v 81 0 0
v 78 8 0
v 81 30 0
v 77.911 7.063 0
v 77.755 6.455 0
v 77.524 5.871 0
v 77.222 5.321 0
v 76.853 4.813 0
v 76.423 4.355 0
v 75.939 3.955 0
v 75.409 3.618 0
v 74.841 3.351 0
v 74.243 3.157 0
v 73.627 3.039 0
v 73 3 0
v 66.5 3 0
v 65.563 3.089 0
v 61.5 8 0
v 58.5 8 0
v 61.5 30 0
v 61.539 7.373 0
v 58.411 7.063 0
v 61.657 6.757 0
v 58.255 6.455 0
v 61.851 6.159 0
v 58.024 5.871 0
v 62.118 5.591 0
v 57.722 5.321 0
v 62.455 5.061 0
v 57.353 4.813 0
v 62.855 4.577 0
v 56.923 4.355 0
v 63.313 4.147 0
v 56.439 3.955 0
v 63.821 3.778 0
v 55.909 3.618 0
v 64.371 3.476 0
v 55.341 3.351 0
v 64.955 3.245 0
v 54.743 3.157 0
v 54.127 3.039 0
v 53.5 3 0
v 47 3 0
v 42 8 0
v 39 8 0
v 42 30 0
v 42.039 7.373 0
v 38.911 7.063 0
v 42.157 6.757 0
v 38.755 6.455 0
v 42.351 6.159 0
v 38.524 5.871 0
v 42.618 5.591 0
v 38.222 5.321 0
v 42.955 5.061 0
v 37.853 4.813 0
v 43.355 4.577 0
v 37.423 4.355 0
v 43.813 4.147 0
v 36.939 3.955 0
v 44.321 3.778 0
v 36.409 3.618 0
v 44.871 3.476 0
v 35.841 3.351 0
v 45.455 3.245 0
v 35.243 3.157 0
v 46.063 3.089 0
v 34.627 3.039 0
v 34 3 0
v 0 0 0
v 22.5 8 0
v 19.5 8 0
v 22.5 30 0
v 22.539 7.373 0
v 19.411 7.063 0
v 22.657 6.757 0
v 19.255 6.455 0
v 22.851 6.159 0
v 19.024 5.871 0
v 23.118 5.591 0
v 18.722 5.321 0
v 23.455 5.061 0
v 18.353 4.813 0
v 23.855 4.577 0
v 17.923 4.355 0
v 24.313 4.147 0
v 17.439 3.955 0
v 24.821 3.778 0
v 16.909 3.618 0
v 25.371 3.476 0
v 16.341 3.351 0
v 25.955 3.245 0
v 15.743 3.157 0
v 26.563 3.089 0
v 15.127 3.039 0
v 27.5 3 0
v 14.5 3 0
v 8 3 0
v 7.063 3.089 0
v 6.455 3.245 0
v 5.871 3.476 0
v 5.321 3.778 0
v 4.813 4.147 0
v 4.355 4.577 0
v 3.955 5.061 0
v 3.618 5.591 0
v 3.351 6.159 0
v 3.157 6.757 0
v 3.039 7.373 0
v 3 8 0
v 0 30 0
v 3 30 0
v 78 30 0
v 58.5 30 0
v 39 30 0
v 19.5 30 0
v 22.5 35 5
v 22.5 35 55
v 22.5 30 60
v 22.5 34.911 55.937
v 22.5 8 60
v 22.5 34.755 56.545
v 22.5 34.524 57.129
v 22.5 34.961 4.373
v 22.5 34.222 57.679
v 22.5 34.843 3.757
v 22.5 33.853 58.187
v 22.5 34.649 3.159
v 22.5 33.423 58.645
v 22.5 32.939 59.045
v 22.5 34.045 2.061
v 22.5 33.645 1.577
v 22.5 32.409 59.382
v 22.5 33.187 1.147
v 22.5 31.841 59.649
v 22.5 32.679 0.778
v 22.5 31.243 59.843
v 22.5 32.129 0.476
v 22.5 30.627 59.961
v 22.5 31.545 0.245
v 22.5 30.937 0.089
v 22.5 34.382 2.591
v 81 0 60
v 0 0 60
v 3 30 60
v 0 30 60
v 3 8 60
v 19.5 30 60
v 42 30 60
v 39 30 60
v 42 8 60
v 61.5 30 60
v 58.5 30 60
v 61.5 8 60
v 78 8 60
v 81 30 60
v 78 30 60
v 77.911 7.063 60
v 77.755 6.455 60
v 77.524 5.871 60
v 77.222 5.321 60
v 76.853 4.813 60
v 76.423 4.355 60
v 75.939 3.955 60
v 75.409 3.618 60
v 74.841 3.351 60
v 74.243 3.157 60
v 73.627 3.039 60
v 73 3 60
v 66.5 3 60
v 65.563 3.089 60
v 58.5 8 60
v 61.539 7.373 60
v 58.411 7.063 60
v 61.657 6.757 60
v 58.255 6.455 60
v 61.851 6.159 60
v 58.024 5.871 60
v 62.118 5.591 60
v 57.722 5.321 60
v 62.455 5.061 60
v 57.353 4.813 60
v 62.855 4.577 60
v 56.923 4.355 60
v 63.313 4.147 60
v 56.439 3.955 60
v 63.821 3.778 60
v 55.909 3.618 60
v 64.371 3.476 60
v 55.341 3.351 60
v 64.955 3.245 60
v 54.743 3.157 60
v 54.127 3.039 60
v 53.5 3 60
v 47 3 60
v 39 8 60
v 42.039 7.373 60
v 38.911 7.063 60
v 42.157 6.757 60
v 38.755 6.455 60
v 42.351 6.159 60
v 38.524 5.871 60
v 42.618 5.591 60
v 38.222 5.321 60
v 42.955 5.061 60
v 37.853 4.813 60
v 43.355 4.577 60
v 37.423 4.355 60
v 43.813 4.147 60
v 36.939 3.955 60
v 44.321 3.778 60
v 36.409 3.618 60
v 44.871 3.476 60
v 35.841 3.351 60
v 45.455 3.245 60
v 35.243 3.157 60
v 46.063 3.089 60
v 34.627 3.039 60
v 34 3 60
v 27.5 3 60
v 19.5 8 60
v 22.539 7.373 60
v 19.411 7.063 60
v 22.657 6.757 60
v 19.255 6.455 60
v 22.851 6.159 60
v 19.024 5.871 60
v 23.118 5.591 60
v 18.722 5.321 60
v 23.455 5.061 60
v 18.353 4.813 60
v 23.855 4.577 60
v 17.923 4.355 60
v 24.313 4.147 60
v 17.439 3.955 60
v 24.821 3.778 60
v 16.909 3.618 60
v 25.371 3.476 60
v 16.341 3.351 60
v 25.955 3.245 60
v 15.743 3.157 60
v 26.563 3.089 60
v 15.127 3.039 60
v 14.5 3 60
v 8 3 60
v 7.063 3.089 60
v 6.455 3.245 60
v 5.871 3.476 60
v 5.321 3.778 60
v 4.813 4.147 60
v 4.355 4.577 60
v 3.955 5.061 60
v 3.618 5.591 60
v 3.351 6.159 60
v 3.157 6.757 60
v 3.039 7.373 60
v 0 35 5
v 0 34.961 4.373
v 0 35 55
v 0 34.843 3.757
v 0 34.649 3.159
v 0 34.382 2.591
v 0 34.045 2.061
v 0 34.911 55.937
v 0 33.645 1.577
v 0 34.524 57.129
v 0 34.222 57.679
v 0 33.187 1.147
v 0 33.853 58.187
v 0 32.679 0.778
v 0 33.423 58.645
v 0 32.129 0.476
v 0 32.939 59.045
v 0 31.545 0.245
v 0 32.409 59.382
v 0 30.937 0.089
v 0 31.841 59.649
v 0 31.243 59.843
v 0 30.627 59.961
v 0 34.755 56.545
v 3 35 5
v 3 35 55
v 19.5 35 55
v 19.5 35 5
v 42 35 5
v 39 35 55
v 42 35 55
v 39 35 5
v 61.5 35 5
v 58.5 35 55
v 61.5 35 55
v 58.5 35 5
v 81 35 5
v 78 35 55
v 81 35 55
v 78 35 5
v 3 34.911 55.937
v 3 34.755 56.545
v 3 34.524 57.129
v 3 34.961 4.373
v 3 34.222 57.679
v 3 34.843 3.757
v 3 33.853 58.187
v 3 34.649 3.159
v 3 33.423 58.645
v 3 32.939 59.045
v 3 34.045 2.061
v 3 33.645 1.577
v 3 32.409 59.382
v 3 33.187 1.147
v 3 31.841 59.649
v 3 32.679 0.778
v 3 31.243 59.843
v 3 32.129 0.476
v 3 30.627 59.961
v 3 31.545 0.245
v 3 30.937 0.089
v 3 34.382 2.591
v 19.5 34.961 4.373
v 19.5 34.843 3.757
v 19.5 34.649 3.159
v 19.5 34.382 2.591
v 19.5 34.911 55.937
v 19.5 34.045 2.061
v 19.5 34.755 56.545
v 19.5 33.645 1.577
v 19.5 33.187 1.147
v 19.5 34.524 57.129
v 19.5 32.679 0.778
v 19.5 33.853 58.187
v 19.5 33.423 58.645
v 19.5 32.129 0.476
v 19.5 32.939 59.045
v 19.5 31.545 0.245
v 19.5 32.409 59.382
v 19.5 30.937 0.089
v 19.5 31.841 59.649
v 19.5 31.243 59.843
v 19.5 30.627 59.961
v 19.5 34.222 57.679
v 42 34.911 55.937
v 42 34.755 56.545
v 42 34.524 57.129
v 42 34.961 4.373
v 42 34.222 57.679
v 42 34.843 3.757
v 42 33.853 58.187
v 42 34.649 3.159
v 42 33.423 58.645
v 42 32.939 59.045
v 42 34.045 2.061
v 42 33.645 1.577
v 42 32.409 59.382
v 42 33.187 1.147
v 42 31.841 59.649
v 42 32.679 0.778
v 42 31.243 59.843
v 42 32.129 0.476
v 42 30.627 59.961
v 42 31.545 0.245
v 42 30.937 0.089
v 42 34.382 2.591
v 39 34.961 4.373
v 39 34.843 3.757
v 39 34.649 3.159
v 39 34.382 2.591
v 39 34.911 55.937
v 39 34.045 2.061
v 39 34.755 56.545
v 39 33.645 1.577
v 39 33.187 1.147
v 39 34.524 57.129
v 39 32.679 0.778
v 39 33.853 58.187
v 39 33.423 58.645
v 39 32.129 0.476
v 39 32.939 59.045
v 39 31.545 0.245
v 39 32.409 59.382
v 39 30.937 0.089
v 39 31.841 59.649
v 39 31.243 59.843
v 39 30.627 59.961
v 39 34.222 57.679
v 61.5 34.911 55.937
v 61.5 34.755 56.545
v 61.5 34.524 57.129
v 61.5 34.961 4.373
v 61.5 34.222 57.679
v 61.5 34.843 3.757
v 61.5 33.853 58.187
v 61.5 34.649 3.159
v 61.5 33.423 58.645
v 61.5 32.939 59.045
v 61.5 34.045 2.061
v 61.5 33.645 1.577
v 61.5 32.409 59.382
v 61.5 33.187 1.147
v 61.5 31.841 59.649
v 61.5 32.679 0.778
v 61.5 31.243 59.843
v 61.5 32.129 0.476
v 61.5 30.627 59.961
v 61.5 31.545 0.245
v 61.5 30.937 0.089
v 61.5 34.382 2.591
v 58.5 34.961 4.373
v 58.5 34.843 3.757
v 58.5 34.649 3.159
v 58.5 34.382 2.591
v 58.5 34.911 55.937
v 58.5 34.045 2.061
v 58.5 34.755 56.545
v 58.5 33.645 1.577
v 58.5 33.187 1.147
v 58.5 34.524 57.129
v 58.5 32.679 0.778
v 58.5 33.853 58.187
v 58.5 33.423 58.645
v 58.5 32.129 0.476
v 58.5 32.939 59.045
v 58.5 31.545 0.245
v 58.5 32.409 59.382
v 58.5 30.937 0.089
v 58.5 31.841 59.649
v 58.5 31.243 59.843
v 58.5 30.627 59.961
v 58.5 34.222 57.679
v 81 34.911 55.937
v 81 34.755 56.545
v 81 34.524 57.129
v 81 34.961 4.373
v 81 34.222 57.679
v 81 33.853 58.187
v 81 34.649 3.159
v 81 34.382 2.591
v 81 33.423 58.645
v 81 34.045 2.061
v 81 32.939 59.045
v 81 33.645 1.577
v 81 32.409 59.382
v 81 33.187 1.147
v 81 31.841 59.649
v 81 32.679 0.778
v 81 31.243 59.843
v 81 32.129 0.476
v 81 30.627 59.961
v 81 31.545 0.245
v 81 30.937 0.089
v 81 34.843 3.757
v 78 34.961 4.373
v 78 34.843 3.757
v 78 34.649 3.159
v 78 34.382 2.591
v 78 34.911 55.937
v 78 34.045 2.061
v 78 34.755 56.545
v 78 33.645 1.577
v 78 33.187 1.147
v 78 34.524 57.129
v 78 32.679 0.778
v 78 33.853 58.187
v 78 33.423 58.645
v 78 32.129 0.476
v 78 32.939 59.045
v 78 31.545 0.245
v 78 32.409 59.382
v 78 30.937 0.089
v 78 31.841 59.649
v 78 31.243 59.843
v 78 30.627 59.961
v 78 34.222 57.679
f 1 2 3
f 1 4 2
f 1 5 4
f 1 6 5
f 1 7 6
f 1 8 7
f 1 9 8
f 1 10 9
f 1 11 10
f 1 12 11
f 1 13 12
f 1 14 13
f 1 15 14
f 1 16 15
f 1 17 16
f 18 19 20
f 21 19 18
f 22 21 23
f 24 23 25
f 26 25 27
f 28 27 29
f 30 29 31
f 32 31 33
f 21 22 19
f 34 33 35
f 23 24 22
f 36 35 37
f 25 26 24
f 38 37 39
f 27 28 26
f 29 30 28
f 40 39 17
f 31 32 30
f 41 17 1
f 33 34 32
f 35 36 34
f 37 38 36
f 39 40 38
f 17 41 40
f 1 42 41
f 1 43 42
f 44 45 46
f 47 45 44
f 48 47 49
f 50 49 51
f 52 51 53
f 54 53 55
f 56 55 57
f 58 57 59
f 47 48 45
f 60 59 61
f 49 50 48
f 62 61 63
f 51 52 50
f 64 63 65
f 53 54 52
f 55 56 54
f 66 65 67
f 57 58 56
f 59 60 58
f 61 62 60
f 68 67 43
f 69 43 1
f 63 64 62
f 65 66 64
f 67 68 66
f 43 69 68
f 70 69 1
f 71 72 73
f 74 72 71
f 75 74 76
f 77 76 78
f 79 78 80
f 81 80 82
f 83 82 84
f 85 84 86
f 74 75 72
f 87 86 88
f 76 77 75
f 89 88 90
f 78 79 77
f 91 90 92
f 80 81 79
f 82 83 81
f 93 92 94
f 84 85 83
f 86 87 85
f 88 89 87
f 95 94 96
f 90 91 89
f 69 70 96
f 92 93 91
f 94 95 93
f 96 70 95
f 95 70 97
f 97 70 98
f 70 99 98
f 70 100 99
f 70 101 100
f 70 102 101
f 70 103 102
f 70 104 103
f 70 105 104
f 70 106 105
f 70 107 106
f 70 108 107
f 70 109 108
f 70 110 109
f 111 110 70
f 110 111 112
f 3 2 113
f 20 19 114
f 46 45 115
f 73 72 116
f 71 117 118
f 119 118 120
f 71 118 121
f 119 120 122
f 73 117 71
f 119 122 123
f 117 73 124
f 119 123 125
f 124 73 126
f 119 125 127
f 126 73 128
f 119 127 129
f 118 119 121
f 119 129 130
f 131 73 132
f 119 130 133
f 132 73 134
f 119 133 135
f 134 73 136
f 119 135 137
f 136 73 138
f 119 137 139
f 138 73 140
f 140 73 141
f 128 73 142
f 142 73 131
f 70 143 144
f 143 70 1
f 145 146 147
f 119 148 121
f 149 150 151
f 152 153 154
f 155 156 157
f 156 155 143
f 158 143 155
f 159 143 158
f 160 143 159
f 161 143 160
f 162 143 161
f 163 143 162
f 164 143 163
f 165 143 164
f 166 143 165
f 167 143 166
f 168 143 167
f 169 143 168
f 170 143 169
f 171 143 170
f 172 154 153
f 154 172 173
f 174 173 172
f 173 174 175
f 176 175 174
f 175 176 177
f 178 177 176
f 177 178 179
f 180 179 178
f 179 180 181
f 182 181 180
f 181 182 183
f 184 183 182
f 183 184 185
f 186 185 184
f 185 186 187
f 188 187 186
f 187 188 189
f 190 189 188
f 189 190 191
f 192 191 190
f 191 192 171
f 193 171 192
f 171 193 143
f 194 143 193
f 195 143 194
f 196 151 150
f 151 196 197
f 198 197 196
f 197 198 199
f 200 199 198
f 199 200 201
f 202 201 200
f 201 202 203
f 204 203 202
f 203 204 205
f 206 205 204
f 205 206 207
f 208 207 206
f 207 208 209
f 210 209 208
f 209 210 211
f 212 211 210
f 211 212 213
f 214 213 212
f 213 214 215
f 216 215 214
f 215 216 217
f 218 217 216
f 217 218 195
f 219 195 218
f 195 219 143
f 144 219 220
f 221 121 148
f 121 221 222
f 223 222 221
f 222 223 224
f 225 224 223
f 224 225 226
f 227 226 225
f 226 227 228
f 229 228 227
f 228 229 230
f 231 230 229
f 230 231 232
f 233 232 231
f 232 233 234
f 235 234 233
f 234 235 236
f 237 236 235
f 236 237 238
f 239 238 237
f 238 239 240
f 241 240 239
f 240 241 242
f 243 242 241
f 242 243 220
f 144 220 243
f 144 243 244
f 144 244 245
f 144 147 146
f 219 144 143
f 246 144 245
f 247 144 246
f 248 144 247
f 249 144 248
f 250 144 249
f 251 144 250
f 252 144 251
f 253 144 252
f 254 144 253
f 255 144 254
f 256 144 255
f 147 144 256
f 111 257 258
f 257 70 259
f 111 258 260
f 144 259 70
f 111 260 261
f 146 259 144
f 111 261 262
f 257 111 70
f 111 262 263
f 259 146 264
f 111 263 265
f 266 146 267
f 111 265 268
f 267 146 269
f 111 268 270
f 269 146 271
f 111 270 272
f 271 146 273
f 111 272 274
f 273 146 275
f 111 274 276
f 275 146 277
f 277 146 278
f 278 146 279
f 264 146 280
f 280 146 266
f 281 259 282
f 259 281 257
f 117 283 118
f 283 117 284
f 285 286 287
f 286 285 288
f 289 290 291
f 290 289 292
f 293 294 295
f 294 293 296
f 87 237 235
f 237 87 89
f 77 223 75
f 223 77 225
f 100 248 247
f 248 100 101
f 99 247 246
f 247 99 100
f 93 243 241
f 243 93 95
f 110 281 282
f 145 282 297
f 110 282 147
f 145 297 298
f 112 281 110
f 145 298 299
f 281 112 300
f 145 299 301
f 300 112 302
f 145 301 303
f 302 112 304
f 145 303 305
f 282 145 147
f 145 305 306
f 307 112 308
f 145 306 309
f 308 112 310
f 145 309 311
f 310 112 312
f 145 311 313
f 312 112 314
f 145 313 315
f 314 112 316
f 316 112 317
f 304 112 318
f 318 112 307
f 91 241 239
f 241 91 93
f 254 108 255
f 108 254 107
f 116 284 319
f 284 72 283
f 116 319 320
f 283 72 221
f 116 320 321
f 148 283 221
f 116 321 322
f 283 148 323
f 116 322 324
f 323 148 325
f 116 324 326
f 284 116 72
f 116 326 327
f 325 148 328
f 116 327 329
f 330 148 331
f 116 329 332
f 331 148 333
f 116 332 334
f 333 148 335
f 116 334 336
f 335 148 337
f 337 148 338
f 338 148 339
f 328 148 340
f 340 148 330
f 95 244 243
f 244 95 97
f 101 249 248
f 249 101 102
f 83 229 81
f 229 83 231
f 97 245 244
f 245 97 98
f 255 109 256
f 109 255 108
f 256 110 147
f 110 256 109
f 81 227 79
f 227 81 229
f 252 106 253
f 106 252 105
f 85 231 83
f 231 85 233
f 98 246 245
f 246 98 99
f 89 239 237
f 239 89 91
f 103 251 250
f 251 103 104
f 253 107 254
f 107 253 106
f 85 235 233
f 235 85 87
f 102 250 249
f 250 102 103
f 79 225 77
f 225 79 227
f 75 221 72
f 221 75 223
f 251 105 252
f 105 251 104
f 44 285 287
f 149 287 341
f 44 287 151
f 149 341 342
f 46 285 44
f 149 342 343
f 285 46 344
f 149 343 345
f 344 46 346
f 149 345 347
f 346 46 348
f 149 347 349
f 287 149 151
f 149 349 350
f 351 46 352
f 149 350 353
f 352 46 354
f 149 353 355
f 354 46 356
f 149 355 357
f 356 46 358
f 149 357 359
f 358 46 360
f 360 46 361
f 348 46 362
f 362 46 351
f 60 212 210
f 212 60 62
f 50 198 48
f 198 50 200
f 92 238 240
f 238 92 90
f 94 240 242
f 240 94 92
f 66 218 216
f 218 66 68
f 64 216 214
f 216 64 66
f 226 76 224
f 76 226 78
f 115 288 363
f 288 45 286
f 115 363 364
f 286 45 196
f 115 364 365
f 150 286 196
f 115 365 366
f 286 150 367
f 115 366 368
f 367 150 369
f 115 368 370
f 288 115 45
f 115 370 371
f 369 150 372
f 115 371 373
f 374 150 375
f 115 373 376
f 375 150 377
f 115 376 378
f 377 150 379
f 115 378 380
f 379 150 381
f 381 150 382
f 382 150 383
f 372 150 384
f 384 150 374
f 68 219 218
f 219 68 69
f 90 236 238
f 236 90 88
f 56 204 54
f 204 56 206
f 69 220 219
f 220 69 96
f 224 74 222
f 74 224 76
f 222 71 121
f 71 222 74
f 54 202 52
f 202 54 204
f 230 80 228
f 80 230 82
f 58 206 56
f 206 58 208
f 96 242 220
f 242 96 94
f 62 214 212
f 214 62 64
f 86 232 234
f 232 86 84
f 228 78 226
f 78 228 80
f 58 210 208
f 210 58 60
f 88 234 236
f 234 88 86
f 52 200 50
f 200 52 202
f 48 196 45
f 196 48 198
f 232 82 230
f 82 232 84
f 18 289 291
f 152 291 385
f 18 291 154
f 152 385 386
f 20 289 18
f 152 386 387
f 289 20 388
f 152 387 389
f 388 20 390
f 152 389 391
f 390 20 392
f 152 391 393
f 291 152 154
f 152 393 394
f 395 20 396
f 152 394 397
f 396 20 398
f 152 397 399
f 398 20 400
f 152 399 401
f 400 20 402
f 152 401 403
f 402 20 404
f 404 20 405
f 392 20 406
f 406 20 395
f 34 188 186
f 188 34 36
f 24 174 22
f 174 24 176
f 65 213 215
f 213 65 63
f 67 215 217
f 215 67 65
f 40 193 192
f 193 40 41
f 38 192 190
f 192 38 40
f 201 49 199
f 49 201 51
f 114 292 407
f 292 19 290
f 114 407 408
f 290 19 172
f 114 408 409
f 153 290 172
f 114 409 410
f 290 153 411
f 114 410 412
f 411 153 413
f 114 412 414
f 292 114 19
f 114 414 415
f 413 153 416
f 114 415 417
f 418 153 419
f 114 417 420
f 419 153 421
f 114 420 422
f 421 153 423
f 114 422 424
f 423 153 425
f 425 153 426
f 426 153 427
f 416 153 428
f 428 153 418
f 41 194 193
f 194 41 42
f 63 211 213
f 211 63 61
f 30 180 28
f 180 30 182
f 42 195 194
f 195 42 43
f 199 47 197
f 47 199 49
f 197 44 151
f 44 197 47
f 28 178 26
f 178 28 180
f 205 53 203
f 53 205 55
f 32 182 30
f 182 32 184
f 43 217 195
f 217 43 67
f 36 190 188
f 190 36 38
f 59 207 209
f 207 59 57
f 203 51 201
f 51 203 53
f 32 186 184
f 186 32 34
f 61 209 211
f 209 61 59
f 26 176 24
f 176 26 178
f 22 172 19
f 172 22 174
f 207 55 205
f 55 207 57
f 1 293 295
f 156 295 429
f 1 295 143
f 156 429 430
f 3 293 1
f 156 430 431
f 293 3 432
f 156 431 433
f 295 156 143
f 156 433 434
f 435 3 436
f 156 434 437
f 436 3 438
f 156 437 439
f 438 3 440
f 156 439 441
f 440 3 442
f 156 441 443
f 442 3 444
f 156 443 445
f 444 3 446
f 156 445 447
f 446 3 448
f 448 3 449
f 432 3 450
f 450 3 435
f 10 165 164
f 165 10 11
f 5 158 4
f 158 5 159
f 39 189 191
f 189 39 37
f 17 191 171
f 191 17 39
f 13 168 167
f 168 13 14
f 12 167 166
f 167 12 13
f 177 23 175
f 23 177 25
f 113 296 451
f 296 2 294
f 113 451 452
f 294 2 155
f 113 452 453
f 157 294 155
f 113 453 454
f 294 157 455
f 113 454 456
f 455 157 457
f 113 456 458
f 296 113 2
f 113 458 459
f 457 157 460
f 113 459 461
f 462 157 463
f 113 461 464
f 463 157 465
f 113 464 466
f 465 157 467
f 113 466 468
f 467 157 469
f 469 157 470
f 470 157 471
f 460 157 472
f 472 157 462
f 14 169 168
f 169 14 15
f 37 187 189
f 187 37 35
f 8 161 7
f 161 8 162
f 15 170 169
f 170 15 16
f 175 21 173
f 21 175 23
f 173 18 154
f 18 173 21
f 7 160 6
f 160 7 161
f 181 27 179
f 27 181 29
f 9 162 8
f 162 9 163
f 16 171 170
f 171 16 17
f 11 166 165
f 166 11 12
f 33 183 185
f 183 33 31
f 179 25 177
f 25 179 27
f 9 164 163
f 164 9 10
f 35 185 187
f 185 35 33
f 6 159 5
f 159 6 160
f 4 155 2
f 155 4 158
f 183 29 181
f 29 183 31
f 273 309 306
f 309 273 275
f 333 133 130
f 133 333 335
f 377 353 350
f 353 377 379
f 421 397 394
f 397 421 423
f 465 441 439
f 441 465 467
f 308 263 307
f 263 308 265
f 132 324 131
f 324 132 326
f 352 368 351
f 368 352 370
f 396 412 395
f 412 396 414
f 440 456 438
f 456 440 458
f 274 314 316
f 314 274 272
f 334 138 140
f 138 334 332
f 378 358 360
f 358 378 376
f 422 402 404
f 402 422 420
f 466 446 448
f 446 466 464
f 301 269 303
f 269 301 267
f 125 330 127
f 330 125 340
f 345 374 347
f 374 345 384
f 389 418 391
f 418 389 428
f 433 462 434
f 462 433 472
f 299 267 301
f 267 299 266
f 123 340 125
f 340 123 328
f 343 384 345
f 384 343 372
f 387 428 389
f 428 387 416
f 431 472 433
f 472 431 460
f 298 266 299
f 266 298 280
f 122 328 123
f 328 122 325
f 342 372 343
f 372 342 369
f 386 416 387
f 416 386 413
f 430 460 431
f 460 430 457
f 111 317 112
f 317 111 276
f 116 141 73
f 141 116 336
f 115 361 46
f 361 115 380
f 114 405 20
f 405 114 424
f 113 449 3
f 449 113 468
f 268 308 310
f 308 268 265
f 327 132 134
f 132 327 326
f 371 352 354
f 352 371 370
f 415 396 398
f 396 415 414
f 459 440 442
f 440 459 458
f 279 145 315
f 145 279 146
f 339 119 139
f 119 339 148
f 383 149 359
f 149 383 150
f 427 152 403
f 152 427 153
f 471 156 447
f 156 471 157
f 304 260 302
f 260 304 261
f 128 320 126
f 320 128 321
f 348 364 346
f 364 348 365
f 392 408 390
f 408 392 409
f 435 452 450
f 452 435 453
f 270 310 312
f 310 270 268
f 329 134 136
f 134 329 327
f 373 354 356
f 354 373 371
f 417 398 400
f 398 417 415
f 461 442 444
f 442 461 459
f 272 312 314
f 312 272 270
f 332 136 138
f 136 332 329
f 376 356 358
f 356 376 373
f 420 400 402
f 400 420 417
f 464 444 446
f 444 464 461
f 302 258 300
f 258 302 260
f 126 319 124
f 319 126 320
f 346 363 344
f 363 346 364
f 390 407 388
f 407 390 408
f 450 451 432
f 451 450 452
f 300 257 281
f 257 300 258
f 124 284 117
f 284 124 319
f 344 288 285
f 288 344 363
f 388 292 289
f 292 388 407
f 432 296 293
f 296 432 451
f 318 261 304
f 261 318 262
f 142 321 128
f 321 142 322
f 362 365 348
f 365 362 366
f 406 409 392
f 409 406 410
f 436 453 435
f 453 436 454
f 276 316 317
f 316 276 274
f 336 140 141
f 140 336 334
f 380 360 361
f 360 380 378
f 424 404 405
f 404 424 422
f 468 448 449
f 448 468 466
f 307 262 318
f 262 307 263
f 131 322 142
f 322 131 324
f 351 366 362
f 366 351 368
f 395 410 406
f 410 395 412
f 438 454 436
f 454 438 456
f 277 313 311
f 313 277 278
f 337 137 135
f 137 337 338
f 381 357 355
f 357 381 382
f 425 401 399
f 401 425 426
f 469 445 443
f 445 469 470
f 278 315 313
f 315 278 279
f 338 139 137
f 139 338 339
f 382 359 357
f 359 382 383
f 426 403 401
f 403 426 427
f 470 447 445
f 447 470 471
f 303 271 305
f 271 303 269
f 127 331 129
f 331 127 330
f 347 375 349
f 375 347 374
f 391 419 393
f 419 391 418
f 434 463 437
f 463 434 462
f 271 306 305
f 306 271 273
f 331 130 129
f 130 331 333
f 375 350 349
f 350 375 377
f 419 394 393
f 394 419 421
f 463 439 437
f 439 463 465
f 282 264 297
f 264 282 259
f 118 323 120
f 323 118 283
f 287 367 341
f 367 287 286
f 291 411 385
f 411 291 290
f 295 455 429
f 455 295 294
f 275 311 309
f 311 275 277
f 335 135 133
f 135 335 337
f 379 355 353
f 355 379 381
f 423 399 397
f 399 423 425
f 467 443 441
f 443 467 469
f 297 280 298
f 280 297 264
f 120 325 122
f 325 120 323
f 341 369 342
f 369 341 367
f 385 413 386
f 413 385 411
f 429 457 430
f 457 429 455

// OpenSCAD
// file: ../common/extrusions.scad
//
// Common extrusions
// Author: Joseph M. Joy FTC 12598 mentor
//
EPSILON = 0.01; // For moving things to properly punch out holes

// Makes a flat (horizontal) "T":
//
// --------------
// |wtXht     --|
// ----\     /---
//      |wbX|
//      |hb |
//      -----
//<xoff>
//
// It could also be an inverted L shape
// if the lower (vertical) bar is wide enough to extend beyond the right 
// hand side of the upper (horizontal) bar.
//
// {xoff} is horizontal distance to the start of the bar.
// {ro} curve of convex corners (not shown above)
// {ri} is the radius of two concave curves
// curve shown as diagonals above.
// t is the thickness of the plate - in
// the z direction.
// Origin is the left hand corner
// of the bounding rectangle.
//
// WARNING: If {ro} and {ri} are too large it will generate sharp
// extrusion artifacts because the straight surfaces are not large to accomodate
// the inner-radius curves.
// 
module T_channelOld(wb, hb, wt, ht, xoff, r, t) {
    ow = 2*wt; // wide enough to 
    oh = 2*(hb+ht); // high enough to descend below the shape

    difference() {
        cube([wt, hb+ht, t]);
        translate([xoff-ow,hb-oh,-EPSILON]) oblong(ow, oh, r, t+2*EPSILON);
        translate([xoff+wb,hb-oh,-EPSILON]) oblong(ow, oh, r, t+2*EPSILON);
    }
}


module T_channel(wb, hb, wt, ht, xoff, ro, ri, t) {
    
    // ow and oh are used to create cutout patterns
    ow = 2*wt; // wide enough to extend to the left and right of shape
    oh = 2*(hb+ht); // high enough to descend below the shape
    
    // Dimensions of the plate that will be cut out - it is just
    // big enough so that the inner-radii can be cut out, no more.
    wp = wb + 2*ri + 2*EPSILON; // dimensions of plate to be cut out
    hp = max(ro, ri) + 2*EPSILON;
    xoffp = xoff - ri - EPSILON;
    yoffp = hb - max(ro, ri) - EPSILON;
    difference() {
        translate([xoffp, yoffp, 0]) cube([wp, hp, t]);
        translate([xoff-ow,hb-oh,-EPSILON]) oblong(ow, oh, ri, t+2*EPSILON);
        translate([xoff+wb,hb-oh,-EPSILON]) oblong(ow, oh, ri, t+2*EPSILON);
    }
    translate([xoff, 0, 0]) oblong(wb, hb, ro, t);
    translate([0, hb, 0]) oblong(wt, ht, ro, t);
}


// Makes a flat (horizontal) "O":
//
// /-------------\
// |             |
// | /--------\  |
// | |         | |
// | |         | |
// | |         | |
// | \         / |
// |  ---------  |
// \------------/
//
//
// It could also be a U or L
// if the oblong hole extends outside the outer
// boundary.
//
// ({xoff},{yoff} is origin of bounding-rectangle of the oblong hole
// {(wo}, {ho}) is the bounding box of the outer oblong.
// {(wi}, {hi}) is the bounding box of the inner (hole) oblong.
// {r} is the radius of the
// curve shown as diagonals above.
// t is the thickness of the plate - in
// the z direction.
// Origin is the left hand corner
// of the bounding rectangle.
// 
module O_channel(wo, ho, wi, hi, xoff, yoff, ro, ri, t) {
    difference() {
        oblong(wo, ho, ro, t);
        translate([xoff, yoff, -EPSILON]) oblong(wi, hi, ri, t+2*EPSILON);
    }
}


// A rectangular prism that fits within {w} x {h} and
// has rounded corners with radius {r} on all 4 sides.
// The actual radius may be reduced so keep the oblong
// viable. {t} is the thickness (in z).
module oblong(w, h, r, t) {
    r = min(r, w/2-EPSILON, h/2-EPSILON);
    translate([r, r, 0])
    linear_extrude(height = t, center = false, convexity = 10) {
        offset(r = r) square([w-2*r, h-2*r]);
    }
}

// A cube that fits within ({w}, {h}, {d}) and has
// all corners rounded with radius r.
module rounded_cube(w, h, d, r) {
        r =  min(r, w/2-EPSILON, h/2-EPSILON, d/2-EPSILON);
        di = 2*r;
    translate([r, r, r]) {
        minkowski() {
            echo(di);
            cube([w-di, h-di, d-di]);
            sphere(r=r);
        }
    }
}

//
// Example code
//
wb = 10;
hb = 20;
wt = 40;
ht = 30;
t = 5;
ro = 5;
ri = 2;
xoff = 10;
move = 30;
$fn = 50;
oblong(wb, hb, ro, t);
translate([0, move, 0]) rounded_cube(wb, hb, t, ro);//, $fn=100);
translate([move, 0, 0]) T_channel(wb, hb, wt, ht, xoff, 5, 1, t);
translate([move, 2*move, 0]) O_channel(wt, hb+ht, wb, 10*hb, xoff, xoff, ro, ri, t);
// main file
// Holder for 4 phones - for the charging station
use <../common/extrusions.scad>
LARGE = 100;
EPSILON = 0.01;

iw = 16.5; // enough to fit phone thickness
thick = 3; // wall thickness
ow = iw + 2*thick;
ri = 5; // internal curvature - should work with phone curvature
ro = 0;
wall_height = 35; // wall height
length = 60; // front-to-back length - along phone should be at least half phone length
dome_r = 5;

module U() {
    O_channel(
    ow, wall_height, 
    iw, LARGE,
    thick, thick,
    ro, ri, length
    );
}

module dome_U() {
    hi = 2*wall_height;
    translate([LARGE-EPSILON,0,0]) rotate([0,-90,0])translate([-thick, 0, 0])
    O_channel(
        length+2*thick, hi/2+2*thick,
        length, hi,
        thick, -hi/2, // offsets
        0, dome_r,
        LARGE
    );
}

module many_Us(n) {
    separation = ow - thick;
    for (i = [0 : n-1]) {
        translate([i*separation, 0, 0]) U();
    }
}

module holder() {
    difference() {
        many_Us(4);
        dome_U();
    }
}

holder();
//dome_U();
//translate ([50, 0, 0]) many_Us(4);
